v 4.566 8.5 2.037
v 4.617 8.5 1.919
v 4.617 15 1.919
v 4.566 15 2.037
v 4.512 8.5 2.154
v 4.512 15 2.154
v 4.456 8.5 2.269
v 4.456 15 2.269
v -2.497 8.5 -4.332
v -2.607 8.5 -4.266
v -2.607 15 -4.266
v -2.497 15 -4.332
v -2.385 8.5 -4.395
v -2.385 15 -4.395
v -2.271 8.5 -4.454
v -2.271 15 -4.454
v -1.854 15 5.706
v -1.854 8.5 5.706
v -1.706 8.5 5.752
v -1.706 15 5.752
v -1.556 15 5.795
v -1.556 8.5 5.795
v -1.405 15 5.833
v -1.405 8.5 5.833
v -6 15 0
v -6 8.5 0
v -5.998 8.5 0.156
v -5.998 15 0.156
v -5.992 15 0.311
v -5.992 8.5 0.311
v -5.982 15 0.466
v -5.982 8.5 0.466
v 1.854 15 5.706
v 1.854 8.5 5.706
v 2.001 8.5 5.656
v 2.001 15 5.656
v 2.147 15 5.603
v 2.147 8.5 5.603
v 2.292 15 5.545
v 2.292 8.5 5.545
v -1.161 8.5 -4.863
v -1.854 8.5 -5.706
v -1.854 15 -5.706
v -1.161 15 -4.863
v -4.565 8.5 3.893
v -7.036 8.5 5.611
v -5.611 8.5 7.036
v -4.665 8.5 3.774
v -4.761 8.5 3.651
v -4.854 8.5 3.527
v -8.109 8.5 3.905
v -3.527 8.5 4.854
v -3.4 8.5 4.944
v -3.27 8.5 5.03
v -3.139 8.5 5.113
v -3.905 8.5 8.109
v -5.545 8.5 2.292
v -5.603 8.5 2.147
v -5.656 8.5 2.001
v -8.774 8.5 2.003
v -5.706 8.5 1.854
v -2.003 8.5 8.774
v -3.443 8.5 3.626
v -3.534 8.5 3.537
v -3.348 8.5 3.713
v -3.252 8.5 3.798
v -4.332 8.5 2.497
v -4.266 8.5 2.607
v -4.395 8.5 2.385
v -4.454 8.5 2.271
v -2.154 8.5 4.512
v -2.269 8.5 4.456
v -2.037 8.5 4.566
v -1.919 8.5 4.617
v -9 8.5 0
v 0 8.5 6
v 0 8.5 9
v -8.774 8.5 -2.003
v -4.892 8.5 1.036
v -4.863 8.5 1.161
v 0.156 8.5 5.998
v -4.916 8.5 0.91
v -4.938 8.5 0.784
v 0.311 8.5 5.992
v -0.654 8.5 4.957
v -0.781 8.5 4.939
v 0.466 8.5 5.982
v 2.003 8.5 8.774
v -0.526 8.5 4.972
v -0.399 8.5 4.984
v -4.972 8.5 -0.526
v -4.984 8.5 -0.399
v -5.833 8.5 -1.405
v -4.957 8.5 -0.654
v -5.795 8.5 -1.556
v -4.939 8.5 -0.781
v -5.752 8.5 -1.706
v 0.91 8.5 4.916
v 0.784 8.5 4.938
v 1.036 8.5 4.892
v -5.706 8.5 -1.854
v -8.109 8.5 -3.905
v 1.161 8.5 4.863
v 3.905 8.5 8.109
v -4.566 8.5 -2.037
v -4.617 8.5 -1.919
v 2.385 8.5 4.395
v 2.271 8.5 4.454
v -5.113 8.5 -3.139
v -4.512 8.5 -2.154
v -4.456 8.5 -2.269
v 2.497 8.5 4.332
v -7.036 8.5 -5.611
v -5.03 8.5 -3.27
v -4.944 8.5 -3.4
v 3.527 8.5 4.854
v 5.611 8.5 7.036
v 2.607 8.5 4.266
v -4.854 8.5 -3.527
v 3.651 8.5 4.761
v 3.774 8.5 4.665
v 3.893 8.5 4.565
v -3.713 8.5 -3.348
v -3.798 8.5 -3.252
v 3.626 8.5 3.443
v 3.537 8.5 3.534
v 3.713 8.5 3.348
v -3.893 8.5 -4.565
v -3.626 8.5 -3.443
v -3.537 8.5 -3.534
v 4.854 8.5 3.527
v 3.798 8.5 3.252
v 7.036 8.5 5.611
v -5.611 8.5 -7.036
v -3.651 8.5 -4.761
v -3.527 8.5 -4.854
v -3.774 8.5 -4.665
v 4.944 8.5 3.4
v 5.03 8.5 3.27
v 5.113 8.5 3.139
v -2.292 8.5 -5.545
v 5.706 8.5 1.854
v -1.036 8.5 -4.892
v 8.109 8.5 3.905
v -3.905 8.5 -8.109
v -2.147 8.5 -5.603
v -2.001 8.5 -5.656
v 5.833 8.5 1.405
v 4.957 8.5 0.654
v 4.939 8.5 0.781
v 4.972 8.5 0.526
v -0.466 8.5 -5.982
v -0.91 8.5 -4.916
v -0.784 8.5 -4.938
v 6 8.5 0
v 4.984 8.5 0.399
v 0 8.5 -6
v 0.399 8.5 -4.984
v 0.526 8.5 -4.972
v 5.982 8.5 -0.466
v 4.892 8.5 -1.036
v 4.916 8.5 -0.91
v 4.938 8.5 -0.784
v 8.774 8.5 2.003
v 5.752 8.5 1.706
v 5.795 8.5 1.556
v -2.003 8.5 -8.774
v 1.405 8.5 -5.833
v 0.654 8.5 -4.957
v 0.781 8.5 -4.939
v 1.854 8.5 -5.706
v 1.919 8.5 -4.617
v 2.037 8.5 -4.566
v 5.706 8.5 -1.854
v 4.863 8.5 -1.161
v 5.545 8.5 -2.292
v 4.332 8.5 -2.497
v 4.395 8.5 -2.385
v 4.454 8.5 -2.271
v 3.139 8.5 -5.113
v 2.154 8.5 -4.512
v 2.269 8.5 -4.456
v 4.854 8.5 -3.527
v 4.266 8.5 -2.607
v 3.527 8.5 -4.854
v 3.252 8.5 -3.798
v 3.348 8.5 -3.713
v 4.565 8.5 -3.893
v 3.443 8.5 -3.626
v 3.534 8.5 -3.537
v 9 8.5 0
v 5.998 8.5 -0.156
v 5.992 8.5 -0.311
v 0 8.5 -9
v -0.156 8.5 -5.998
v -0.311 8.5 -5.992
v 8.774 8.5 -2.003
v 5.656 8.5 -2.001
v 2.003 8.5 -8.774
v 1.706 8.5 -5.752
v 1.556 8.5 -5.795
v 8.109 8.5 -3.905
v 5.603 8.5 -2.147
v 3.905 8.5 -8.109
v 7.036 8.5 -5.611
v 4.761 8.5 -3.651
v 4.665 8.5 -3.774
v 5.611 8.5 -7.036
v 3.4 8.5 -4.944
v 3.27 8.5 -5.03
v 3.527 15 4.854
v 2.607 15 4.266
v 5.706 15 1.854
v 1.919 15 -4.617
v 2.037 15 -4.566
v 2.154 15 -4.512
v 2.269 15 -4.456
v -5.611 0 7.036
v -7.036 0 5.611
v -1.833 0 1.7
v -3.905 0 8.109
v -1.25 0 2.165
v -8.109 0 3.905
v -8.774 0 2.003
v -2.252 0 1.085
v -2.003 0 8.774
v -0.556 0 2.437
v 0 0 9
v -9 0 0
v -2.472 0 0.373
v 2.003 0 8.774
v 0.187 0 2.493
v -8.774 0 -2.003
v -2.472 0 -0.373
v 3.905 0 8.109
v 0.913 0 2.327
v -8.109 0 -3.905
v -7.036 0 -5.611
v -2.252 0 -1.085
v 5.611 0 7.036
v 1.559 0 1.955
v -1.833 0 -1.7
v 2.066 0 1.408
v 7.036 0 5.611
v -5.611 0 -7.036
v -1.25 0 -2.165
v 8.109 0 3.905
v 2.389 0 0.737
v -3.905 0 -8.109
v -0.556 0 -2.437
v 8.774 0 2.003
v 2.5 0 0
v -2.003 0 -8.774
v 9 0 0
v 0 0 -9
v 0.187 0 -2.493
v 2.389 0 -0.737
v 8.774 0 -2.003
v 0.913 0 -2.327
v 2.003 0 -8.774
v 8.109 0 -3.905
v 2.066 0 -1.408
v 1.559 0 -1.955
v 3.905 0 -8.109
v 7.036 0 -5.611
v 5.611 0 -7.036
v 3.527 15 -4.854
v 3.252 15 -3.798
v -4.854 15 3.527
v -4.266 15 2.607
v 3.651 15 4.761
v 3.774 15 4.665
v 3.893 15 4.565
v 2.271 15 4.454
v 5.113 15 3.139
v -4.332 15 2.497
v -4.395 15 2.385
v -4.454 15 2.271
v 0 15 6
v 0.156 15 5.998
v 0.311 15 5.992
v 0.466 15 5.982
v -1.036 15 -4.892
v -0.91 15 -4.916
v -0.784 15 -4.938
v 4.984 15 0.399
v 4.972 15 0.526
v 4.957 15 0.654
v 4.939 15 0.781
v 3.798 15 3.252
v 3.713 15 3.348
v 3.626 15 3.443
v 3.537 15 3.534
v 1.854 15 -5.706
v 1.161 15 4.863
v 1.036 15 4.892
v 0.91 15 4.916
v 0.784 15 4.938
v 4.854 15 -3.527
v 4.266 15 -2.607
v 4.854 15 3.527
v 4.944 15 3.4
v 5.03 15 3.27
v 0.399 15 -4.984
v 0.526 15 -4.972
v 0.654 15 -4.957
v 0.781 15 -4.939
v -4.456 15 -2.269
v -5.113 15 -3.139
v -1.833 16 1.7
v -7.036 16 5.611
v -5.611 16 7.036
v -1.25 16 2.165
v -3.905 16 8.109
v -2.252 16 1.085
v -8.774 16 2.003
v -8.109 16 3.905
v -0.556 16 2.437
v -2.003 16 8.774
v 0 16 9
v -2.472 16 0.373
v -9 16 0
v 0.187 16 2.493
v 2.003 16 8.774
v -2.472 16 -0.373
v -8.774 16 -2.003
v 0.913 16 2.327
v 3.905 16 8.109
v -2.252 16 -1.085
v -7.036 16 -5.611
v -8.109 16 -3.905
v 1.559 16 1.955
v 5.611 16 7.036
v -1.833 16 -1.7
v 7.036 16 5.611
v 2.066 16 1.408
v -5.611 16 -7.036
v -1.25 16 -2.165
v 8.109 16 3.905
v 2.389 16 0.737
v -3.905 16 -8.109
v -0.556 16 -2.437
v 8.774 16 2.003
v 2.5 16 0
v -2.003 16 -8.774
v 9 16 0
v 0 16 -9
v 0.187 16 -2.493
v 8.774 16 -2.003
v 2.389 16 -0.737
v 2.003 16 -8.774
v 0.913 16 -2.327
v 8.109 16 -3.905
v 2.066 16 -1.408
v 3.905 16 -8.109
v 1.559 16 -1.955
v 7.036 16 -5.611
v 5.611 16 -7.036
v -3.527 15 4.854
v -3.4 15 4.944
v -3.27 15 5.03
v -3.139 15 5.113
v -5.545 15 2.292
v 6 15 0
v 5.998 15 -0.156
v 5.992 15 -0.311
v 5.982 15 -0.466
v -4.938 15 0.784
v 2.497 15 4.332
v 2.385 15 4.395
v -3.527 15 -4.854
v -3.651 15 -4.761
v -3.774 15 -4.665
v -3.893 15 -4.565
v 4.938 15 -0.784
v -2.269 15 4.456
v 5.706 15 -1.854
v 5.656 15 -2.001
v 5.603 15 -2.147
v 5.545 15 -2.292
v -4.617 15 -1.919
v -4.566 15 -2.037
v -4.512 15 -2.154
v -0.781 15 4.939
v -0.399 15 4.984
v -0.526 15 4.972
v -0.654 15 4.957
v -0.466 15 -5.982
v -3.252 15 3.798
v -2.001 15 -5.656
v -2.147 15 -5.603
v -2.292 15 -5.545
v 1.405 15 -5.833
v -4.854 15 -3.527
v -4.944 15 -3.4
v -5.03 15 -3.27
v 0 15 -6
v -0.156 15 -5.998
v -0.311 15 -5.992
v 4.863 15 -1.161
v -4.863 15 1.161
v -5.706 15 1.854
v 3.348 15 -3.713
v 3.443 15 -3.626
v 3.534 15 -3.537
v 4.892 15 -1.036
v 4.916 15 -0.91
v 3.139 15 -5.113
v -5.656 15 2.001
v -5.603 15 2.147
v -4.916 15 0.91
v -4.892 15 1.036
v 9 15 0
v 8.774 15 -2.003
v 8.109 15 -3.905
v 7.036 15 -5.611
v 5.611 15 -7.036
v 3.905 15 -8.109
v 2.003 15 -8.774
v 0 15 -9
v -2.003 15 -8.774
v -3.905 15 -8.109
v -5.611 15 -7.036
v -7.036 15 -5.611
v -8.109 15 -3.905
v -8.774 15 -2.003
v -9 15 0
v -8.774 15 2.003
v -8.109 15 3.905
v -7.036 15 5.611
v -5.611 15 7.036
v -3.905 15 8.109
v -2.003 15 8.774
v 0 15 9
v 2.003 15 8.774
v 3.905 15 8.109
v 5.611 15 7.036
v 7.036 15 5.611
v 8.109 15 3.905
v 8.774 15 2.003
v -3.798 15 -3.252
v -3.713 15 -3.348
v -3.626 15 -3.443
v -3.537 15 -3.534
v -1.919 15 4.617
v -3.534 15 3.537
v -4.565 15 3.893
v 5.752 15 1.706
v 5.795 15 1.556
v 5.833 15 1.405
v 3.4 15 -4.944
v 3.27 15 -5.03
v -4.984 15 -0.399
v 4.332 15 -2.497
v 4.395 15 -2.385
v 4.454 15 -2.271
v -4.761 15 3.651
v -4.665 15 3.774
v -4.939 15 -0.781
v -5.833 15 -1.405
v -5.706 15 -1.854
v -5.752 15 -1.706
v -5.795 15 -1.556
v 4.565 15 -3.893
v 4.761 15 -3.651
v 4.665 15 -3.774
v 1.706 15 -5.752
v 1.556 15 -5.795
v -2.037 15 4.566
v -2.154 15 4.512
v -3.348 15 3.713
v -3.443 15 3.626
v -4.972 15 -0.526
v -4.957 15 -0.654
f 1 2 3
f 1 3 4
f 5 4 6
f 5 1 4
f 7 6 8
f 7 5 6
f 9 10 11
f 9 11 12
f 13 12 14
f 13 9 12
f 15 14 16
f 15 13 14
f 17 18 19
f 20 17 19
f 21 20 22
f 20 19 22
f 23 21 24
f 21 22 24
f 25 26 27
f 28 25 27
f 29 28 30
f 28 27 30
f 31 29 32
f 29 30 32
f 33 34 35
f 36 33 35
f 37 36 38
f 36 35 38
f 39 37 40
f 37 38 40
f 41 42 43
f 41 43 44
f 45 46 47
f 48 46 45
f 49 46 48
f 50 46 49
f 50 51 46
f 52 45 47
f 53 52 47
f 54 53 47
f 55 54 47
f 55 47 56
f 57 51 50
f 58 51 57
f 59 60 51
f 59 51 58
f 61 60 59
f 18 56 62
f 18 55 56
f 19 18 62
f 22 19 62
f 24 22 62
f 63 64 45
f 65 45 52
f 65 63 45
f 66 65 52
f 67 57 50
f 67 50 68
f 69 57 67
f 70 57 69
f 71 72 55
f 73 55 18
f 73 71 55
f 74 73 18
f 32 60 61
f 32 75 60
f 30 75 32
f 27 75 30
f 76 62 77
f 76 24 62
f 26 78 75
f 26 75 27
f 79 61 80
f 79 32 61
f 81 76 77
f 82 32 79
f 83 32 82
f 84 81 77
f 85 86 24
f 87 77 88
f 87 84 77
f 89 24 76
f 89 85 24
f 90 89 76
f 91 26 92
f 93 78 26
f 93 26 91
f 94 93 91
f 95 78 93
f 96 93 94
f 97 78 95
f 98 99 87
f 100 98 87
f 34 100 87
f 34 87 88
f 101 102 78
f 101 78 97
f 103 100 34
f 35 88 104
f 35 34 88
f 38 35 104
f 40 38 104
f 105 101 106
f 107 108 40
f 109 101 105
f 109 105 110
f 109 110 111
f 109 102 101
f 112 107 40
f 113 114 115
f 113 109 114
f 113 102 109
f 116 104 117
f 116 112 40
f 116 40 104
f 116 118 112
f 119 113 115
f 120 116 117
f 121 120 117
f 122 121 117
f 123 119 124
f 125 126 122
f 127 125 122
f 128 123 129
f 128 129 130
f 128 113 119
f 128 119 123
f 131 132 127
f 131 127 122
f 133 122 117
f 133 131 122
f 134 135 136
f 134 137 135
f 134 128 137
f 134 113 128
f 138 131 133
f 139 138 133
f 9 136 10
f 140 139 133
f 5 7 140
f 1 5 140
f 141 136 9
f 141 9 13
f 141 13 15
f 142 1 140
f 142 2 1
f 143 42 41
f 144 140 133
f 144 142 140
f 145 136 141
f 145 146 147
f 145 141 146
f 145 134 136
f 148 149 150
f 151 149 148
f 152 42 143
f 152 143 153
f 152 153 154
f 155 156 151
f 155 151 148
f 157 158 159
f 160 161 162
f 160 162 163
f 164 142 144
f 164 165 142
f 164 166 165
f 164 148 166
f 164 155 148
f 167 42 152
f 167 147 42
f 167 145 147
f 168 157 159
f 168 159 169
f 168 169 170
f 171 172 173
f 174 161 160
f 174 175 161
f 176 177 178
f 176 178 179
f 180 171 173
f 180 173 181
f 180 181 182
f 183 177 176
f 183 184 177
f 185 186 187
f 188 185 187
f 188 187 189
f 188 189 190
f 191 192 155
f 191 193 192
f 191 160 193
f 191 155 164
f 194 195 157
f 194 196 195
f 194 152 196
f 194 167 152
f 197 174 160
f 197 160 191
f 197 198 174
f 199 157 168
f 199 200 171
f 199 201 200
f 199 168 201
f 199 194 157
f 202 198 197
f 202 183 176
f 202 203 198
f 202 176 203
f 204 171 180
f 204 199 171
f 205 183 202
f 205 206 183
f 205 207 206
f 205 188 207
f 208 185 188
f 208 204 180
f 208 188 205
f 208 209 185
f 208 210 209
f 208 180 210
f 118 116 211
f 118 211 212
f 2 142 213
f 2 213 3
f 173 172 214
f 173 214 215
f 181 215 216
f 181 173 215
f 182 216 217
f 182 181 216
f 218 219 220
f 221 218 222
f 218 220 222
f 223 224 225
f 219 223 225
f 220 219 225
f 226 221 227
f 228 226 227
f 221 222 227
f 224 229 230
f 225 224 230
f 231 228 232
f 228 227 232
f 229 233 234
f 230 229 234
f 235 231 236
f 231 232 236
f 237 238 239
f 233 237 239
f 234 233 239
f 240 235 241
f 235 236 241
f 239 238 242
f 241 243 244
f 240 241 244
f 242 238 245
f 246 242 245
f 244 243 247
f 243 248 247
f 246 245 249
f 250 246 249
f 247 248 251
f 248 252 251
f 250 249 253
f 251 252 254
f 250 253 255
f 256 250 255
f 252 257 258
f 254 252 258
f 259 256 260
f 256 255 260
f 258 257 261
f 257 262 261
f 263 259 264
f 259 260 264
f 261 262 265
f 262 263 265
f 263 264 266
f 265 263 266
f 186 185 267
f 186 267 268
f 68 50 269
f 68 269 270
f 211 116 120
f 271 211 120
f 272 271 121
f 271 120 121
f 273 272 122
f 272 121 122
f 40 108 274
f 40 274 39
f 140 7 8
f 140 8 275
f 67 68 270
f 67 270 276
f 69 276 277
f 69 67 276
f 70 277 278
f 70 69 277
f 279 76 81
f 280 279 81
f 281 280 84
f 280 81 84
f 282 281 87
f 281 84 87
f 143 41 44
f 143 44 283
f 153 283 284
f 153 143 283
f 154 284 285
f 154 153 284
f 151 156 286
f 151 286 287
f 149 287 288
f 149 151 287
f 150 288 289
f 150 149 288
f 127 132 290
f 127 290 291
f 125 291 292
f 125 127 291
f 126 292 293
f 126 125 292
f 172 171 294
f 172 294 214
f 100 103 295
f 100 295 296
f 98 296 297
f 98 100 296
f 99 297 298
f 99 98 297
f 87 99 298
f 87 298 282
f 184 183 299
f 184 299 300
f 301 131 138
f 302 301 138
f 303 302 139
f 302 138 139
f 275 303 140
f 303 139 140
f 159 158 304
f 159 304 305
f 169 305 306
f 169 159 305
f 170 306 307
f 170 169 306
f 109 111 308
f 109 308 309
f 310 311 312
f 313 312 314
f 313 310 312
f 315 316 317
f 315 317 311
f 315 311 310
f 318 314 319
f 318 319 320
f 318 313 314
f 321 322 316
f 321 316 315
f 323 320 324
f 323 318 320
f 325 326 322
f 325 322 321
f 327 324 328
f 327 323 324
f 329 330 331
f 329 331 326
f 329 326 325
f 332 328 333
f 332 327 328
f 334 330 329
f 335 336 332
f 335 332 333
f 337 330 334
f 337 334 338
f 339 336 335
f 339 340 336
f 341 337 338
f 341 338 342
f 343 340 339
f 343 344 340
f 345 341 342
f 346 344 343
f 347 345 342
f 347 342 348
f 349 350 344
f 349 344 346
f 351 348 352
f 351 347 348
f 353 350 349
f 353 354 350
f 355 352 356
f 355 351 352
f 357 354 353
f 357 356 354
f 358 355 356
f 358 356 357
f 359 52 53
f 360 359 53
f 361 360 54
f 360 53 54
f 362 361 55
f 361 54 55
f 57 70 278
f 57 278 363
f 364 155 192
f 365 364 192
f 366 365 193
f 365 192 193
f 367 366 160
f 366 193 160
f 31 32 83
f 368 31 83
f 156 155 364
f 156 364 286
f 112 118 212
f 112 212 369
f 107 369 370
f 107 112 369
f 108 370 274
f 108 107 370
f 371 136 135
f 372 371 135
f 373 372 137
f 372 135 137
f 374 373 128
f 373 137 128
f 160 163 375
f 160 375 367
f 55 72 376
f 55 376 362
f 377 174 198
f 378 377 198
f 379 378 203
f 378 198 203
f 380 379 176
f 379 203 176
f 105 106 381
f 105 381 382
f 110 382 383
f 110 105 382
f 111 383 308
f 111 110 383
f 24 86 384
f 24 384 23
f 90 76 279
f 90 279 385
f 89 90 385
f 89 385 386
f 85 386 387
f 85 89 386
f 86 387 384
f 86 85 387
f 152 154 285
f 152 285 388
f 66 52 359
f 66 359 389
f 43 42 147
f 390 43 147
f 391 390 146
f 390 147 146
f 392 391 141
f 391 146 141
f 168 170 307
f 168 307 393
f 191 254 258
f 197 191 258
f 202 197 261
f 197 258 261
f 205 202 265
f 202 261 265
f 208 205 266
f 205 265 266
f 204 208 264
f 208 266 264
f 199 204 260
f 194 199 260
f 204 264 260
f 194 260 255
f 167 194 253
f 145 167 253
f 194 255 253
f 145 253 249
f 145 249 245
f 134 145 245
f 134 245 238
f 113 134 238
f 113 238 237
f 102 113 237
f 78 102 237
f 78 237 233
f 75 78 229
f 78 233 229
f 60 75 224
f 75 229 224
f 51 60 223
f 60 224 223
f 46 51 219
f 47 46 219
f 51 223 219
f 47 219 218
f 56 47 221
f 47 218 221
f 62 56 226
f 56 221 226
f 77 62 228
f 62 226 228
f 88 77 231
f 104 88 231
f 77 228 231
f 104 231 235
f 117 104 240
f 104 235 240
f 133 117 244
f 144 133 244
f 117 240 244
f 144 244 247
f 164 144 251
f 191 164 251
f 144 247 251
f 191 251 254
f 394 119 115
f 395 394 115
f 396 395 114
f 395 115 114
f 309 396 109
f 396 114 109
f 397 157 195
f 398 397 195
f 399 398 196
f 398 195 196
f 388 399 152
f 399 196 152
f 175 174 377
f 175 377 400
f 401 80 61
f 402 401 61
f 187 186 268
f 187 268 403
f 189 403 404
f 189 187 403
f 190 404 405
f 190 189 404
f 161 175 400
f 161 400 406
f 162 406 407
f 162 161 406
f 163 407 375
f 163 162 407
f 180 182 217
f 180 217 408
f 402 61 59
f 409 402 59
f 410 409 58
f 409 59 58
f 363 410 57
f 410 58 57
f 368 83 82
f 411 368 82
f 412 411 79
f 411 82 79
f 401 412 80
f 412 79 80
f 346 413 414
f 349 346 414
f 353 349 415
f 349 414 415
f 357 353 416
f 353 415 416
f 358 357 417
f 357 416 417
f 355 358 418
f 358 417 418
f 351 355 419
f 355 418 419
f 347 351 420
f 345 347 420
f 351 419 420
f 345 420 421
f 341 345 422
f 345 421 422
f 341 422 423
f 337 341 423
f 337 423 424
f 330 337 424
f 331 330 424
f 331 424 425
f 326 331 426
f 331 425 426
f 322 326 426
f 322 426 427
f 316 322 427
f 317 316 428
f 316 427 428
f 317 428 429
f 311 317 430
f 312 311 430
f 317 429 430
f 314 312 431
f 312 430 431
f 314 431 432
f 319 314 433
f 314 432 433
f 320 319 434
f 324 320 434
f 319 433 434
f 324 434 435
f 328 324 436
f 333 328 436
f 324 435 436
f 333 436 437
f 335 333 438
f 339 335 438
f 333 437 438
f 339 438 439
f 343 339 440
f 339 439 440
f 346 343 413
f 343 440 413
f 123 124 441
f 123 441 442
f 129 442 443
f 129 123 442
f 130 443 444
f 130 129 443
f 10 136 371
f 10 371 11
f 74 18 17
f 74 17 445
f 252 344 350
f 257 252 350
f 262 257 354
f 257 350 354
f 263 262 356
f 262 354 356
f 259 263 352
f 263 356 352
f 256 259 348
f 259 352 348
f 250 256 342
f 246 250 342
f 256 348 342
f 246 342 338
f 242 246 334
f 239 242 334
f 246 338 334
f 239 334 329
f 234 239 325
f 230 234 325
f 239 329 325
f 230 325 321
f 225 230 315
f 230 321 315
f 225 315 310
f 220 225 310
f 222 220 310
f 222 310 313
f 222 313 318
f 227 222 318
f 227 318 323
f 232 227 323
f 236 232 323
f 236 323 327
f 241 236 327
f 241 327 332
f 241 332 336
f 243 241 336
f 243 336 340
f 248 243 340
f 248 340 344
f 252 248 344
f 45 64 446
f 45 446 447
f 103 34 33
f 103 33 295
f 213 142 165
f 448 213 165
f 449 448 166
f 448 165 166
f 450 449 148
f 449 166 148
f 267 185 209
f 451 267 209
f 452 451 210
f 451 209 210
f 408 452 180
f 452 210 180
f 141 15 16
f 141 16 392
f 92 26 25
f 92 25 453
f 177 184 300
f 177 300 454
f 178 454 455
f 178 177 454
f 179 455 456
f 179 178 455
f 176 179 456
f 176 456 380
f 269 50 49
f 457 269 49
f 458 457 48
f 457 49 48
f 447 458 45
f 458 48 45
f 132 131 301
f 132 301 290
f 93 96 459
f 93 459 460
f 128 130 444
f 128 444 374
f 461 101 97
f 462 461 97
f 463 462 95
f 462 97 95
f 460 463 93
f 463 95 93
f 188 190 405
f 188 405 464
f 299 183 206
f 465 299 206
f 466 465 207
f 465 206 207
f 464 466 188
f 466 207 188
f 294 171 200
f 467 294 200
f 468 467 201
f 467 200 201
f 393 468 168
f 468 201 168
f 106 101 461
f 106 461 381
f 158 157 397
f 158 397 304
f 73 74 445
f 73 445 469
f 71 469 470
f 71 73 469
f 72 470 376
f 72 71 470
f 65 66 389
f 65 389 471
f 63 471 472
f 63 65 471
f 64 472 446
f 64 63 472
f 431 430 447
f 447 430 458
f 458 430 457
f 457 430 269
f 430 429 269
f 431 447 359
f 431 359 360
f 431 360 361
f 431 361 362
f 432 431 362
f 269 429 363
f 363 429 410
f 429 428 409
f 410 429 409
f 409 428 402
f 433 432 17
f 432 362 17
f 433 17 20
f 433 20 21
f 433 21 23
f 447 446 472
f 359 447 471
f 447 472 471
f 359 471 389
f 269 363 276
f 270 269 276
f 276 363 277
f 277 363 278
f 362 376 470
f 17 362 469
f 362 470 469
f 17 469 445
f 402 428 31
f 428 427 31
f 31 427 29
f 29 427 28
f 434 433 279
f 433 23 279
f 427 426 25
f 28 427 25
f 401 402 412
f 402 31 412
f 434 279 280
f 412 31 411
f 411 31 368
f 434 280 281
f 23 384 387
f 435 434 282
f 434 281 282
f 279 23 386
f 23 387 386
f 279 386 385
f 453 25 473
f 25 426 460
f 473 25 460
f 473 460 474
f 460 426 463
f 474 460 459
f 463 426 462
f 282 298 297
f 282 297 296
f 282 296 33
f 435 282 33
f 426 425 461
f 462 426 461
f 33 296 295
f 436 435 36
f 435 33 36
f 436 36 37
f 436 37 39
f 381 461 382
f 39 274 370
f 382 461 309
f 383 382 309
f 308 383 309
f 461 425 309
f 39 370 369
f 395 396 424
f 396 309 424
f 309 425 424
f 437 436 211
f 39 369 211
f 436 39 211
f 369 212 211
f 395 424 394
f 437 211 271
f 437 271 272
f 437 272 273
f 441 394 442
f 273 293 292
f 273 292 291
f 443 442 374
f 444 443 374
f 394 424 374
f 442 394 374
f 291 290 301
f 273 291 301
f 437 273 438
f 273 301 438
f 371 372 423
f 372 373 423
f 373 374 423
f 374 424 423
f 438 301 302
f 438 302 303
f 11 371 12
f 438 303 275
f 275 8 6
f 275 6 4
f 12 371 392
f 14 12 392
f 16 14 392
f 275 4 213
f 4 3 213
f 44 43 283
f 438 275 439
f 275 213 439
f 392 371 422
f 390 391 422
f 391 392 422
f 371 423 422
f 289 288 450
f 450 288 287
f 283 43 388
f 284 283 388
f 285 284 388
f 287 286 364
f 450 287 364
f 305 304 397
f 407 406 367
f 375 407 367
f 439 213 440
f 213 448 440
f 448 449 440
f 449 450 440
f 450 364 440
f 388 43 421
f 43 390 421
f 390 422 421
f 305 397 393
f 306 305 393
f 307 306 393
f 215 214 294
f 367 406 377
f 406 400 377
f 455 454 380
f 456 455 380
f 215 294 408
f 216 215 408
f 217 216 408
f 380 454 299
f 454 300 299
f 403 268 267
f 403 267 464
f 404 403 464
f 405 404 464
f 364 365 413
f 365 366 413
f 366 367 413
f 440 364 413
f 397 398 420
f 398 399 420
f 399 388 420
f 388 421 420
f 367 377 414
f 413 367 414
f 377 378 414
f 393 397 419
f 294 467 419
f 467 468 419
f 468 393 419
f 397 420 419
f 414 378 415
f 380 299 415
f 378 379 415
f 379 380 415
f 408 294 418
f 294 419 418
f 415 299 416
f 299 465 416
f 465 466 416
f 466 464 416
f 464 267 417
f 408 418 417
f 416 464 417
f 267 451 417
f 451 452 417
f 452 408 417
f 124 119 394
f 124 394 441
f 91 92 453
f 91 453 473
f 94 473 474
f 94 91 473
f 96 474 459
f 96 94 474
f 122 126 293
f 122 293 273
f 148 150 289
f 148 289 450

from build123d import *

# Parameters (mm, degrees)
SKETCH_1_R          = 9
EXTRUDE_1_DEPTH     = 8.5
SKETCH_2_R          = 6
EXTRUDE_2_DEPTH     = 6.5
SKETCH_3_R          = 9
EXTRUDE_3_DEPTH     = 1
SKETCH_4_R          = 2.5
CUT_EXTRUDE_1_DEPTH = 17
CUT_EXTRUDE_2_DEPTH = 6.5


with BuildPart() as part:
    # 草图1 → 凸台-拉伸1 (new body)
    with BuildSketch(Plane(origin=(0, 0, 0), x_dir=(1, 0, 0), z_dir=(0, 1, 0))):
        Circle(SKETCH_1_R)
    extrude(amount=EXTRUDE_1_DEPTH)

    # 草图2 → 凸台-拉伸2 (add)
    with BuildSketch(Plane(origin=(0, 8.5, 0), x_dir=(1, 0, 0), z_dir=(0, 1, 0))):
        Circle(SKETCH_2_R)
    extrude(amount=EXTRUDE_2_DEPTH)

    # 草图3 → 凸台-拉伸3 (add)
    with BuildSketch(Plane(origin=(0, 15, 0), x_dir=(1, 0, 0), z_dir=(0, 1, 0))):
        Circle(SKETCH_3_R)
    extrude(amount=EXTRUDE_3_DEPTH)

    # 草图4 → 切除-拉伸1 (cut, through all)
    with BuildSketch(Plane(origin=(0, 16, 0), x_dir=(1, 0, 0), z_dir=(0, 1, 0))):
        Circle(SKETCH_4_R)
    extrude(amount=-CUT_EXTRUDE_1_DEPTH, mode=Mode.SUBTRACT)

    # 草图5 → 切除-拉伸2 (cut)
    with BuildSketch(Plane(origin=(0, 8.5, 0), x_dir=(1, 0, 0), z_dir=(0, 1, 0))):
        with BuildLine():
            Line((-6, 0), (-4.984088538, 0.398574263))
            ThreePointArc((-4.984088538, 0.398574263), (-4.96506054, 0.590062568), (-4.938678327, 0.780676876))
            Line((-4.938678327, 0.780676876), (-5.83314158, 1.40515455))
            ThreePointArc((-5.83314158, 1.40515455), (-5.958139369, 0.707513435), (-6, 0))
        make_face()
        with BuildLine():
            Line((-5.981863946, -0.466158487), (-4.938204626, -0.783667703))
            ThreePointArc((-4.938204626, -0.783667703), (-4.904392542, -0.973105234), (-4.863316103, -1.161101409))
            Line((-4.863316103, -1.161101409), (-5.706339098, -1.854101966))
            ThreePointArc((-5.706339098, -1.854101966), (-5.885160947, -1.168281057), (-5.981863946, -0.466158487))
        make_face()
        with BuildLine():
            Line((-5.706339098, 1.854101966), (-4.616983661, 1.91923471))
            ThreePointArc((-4.616983661, 1.91923471), (-4.539713819, 2.095470935), (-4.455719783, 2.268603363))
            Line((-4.455719783, 2.268603363), (-5.113430674, 3.13892127))
            ThreePointArc((-5.113430674, 3.13892127), (-5.447893597, 2.514051583), (-5.706339098, 1.854101966))
        make_face()
        with BuildLine():
            Line((-4.854101966, 3.526711514), (-3.797936255, 3.252027091))
            ThreePointArc((-3.797936255, 3.252027091), (-3.669988279, 3.395760008), (-3.536604341, 3.534463146))
            Line((-3.536604341, 3.534463146), (-3.893181547, 4.565428506))
            ThreePointArc((-3.893181547, 4.565428506), (-4.404370041, 4.074496845), (-4.854101966, 3.526711514))
        make_face()
        with BuildLine():
            Line((-3.526711514, 4.854101966), (-2.607120386, 4.266488403))
            ThreePointArc((-2.607120386, 4.266488403), (-2.441018717, 4.36364843), (-2.271301426, 4.454345051))
            Line((-2.271301426, 4.454345051), (-2.291840684, 5.545039791))
            ThreePointArc((-2.291840684, 5.545039791), (-2.929716059, 5.236101967), (-3.526711514, 4.854101966))
        make_face()
        with BuildLine():
            Line((-1.854101966, 5.706339098), (-1.161101409, 4.863316103))
            ThreePointArc((-1.161101409, 4.863316103), (-0.973105234, 4.904392542), (-0.783667703, 4.938204626))
            Line((-0.783667703, 4.938204626), (-0.466158487, 5.981863946))
            ThreePointArc((-0.466158487, 5.981863946), (-1.168281057, 5.885160947), (-1.854101966, 5.706339098))
        make_face()
        with BuildLine():
            Line((0, 6), (0.398574263, 4.984088538))
            ThreePointArc((0.398574263, 4.984088538), (0.590062568, 4.96506054), (0.780676876, 4.938678327))
            Line((0.780676876, 4.938678327), (1.40515455, 5.83314158))
            ThreePointArc((1.40515455, 5.83314158), (0.707513435, 5.958139369), (0, 6))
        make_face()
        with BuildLine():
            Line((1.854101966, 5.706339098), (1.91923471, 4.616983661))
            ThreePointArc((1.91923471, 4.616983661), (2.095470935, 4.539713819), (2.268603363, 4.455719783))
            Line((2.268603363, 4.455719783), (3.13892127, 5.113430674))
            ThreePointArc((3.13892127, 5.113430674), (2.514051583, 5.447893597), (1.854101966, 5.706339098))
        make_face()
        with BuildLine():
            Line((3.526711514, 4.854101966), (3.252027091, 3.797936255))
            ThreePointArc((3.252027091, 3.797936255), (3.395760008, 3.669988279), (3.534463146, 3.536604341))
            Line((3.534463146, 3.536604341), (4.565428506, 3.893181547))
            ThreePointArc((4.565428506, 3.893181547), (4.074496845, 4.404370041), (3.526711514, 4.854101966))
        make_face()
        with BuildLine():
            Line((4.854101966, 3.526711514), (4.266488403, 2.607120386))
            ThreePointArc((4.266488403, 2.607120386), (4.36364843, 2.441018717), (4.454345051, 2.271301426))
            Line((4.454345051, 2.271301426), (5.545039791, 2.291840684))
            ThreePointArc((5.545039791, 2.291840684), (5.236101967, 2.929716059), (4.854101966, 3.526711514))
        make_face()
        with BuildLine():
            Line((5.706339098, 1.854101966), (4.863316103, 1.161101409))
            ThreePointArc((4.863316103, 1.161101409), (4.904392542, 0.973105234), (4.938204626, 0.783667703))
            Line((4.938204626, 0.783667703), (5.981863946, 0.466158487))
            ThreePointArc((5.981863946, 0.466158487), (5.885160947, 1.168281057), (5.706339098, 1.854101966))
        make_face()
        with BuildLine():
            Line((6, 0), (4.984088538, -0.398574263))
            ThreePointArc((4.984088538, -0.398574263), (4.96506054, -0.590062568), (4.938678327, -0.780676876))
            Line((4.938678327, -0.780676876), (5.83314158, -1.40515455))
            ThreePointArc((5.83314158, -1.40515455), (5.958139369, -0.707513435), (6, 0))
        make_face()
        with BuildLine():
            Line((5.706339098, -1.854101966), (4.616983661, -1.91923471))
            ThreePointArc((4.616983661, -1.91923471), (4.539713819, -2.095470935), (4.455719783, -2.268603363))
            Line((4.455719783, -2.268603363), (5.113430674, -3.13892127))
            ThreePointArc((5.113430674, -3.13892127), (5.447893597, -2.514051583), (5.706339098, -1.854101966))
        make_face()
        with BuildLine():
            Line((4.854101966, -3.526711514), (3.797936255, -3.252027091))
            ThreePointArc((3.797936255, -3.252027091), (3.669988279, -3.395760008), (3.536604341, -3.534463146))
            Line((3.536604341, -3.534463146), (3.893181547, -4.565428506))
            ThreePointArc((3.893181547, -4.565428506), (4.404370041, -4.074496845), (4.854101966, -3.526711514))
        make_face()
        with BuildLine():
            Line((3.526711514, -4.854101966), (2.607120386, -4.266488403))
            ThreePointArc((2.607120386, -4.266488403), (2.441018717, -4.36364843), (2.271301426, -4.454345051))
            Line((2.271301426, -4.454345051), (2.291840684, -5.545039791))
            ThreePointArc((2.291840684, -5.545039791), (2.929716059, -5.236101967), (3.526711514, -4.854101966))
        make_face()
        with BuildLine():
            Line((1.854101966, -5.706339098), (1.161101409, -4.863316103))
            ThreePointArc((1.161101409, -4.863316103), (0.973105234, -4.904392542), (0.783667703, -4.938204626))
            Line((0.783667703, -4.938204626), (0.466158487, -5.981863946))
            ThreePointArc((0.466158487, -5.981863946), (1.168281057, -5.885160947), (1.854101966, -5.706339098))
        make_face()
        with BuildLine():
            Line((0, -6), (-0.398574263, -4.984088538))
            ThreePointArc((-0.398574263, -4.984088538), (-0.590062568, -4.96506054), (-0.780676876, -4.938678327))
            Line((-0.780676876, -4.938678327), (-1.40515455, -5.83314158))
            ThreePointArc((-1.40515455, -5.83314158), (-0.707513435, -5.958139369), (0, -6))
        make_face()
        with BuildLine():
            Line((-1.854101966, -5.706339098), (-1.91923471, -4.616983661))
            ThreePointArc((-1.91923471, -4.616983661), (-2.095470935, -4.539713819), (-2.268603363, -4.455719783))
            Line((-2.268603363, -4.455719783), (-3.13892127, -5.113430674))
            ThreePointArc((-3.13892127, -5.113430674), (-2.514051583, -5.447893597), (-1.854101966, -5.706339098))
        make_face()
        with BuildLine():
            Line((-3.526711514, -4.854101966), (-3.252027091, -3.797936255))
            ThreePointArc((-3.252027091, -3.797936255), (-3.395760008, -3.669988279), (-3.534463146, -3.536604341))
            Line((-3.534463146, -3.536604341), (-4.565428506, -3.893181547))
            ThreePointArc((-4.565428506, -3.893181547), (-4.074496845, -4.404370041), (-3.526711514, -4.854101966))
        make_face()
        with BuildLine():
            Line((-4.854101966, -3.526711514), (-4.266488403, -2.607120386))
            ThreePointArc((-4.266488403, -2.607120386), (-4.36364843, -2.441018717), (-4.454345051, -2.271301426))
            Line((-4.454345051, -2.271301426), (-5.545039791, -2.291840684))
            ThreePointArc((-5.545039791, -2.291840684), (-5.236101967, -2.929716059), (-4.854101966, -3.526711514))
        make_face()
    extrude(amount=CUT_EXTRUDE_2_DEPTH, mode=Mode.SUBTRACT)


solid = part.part
